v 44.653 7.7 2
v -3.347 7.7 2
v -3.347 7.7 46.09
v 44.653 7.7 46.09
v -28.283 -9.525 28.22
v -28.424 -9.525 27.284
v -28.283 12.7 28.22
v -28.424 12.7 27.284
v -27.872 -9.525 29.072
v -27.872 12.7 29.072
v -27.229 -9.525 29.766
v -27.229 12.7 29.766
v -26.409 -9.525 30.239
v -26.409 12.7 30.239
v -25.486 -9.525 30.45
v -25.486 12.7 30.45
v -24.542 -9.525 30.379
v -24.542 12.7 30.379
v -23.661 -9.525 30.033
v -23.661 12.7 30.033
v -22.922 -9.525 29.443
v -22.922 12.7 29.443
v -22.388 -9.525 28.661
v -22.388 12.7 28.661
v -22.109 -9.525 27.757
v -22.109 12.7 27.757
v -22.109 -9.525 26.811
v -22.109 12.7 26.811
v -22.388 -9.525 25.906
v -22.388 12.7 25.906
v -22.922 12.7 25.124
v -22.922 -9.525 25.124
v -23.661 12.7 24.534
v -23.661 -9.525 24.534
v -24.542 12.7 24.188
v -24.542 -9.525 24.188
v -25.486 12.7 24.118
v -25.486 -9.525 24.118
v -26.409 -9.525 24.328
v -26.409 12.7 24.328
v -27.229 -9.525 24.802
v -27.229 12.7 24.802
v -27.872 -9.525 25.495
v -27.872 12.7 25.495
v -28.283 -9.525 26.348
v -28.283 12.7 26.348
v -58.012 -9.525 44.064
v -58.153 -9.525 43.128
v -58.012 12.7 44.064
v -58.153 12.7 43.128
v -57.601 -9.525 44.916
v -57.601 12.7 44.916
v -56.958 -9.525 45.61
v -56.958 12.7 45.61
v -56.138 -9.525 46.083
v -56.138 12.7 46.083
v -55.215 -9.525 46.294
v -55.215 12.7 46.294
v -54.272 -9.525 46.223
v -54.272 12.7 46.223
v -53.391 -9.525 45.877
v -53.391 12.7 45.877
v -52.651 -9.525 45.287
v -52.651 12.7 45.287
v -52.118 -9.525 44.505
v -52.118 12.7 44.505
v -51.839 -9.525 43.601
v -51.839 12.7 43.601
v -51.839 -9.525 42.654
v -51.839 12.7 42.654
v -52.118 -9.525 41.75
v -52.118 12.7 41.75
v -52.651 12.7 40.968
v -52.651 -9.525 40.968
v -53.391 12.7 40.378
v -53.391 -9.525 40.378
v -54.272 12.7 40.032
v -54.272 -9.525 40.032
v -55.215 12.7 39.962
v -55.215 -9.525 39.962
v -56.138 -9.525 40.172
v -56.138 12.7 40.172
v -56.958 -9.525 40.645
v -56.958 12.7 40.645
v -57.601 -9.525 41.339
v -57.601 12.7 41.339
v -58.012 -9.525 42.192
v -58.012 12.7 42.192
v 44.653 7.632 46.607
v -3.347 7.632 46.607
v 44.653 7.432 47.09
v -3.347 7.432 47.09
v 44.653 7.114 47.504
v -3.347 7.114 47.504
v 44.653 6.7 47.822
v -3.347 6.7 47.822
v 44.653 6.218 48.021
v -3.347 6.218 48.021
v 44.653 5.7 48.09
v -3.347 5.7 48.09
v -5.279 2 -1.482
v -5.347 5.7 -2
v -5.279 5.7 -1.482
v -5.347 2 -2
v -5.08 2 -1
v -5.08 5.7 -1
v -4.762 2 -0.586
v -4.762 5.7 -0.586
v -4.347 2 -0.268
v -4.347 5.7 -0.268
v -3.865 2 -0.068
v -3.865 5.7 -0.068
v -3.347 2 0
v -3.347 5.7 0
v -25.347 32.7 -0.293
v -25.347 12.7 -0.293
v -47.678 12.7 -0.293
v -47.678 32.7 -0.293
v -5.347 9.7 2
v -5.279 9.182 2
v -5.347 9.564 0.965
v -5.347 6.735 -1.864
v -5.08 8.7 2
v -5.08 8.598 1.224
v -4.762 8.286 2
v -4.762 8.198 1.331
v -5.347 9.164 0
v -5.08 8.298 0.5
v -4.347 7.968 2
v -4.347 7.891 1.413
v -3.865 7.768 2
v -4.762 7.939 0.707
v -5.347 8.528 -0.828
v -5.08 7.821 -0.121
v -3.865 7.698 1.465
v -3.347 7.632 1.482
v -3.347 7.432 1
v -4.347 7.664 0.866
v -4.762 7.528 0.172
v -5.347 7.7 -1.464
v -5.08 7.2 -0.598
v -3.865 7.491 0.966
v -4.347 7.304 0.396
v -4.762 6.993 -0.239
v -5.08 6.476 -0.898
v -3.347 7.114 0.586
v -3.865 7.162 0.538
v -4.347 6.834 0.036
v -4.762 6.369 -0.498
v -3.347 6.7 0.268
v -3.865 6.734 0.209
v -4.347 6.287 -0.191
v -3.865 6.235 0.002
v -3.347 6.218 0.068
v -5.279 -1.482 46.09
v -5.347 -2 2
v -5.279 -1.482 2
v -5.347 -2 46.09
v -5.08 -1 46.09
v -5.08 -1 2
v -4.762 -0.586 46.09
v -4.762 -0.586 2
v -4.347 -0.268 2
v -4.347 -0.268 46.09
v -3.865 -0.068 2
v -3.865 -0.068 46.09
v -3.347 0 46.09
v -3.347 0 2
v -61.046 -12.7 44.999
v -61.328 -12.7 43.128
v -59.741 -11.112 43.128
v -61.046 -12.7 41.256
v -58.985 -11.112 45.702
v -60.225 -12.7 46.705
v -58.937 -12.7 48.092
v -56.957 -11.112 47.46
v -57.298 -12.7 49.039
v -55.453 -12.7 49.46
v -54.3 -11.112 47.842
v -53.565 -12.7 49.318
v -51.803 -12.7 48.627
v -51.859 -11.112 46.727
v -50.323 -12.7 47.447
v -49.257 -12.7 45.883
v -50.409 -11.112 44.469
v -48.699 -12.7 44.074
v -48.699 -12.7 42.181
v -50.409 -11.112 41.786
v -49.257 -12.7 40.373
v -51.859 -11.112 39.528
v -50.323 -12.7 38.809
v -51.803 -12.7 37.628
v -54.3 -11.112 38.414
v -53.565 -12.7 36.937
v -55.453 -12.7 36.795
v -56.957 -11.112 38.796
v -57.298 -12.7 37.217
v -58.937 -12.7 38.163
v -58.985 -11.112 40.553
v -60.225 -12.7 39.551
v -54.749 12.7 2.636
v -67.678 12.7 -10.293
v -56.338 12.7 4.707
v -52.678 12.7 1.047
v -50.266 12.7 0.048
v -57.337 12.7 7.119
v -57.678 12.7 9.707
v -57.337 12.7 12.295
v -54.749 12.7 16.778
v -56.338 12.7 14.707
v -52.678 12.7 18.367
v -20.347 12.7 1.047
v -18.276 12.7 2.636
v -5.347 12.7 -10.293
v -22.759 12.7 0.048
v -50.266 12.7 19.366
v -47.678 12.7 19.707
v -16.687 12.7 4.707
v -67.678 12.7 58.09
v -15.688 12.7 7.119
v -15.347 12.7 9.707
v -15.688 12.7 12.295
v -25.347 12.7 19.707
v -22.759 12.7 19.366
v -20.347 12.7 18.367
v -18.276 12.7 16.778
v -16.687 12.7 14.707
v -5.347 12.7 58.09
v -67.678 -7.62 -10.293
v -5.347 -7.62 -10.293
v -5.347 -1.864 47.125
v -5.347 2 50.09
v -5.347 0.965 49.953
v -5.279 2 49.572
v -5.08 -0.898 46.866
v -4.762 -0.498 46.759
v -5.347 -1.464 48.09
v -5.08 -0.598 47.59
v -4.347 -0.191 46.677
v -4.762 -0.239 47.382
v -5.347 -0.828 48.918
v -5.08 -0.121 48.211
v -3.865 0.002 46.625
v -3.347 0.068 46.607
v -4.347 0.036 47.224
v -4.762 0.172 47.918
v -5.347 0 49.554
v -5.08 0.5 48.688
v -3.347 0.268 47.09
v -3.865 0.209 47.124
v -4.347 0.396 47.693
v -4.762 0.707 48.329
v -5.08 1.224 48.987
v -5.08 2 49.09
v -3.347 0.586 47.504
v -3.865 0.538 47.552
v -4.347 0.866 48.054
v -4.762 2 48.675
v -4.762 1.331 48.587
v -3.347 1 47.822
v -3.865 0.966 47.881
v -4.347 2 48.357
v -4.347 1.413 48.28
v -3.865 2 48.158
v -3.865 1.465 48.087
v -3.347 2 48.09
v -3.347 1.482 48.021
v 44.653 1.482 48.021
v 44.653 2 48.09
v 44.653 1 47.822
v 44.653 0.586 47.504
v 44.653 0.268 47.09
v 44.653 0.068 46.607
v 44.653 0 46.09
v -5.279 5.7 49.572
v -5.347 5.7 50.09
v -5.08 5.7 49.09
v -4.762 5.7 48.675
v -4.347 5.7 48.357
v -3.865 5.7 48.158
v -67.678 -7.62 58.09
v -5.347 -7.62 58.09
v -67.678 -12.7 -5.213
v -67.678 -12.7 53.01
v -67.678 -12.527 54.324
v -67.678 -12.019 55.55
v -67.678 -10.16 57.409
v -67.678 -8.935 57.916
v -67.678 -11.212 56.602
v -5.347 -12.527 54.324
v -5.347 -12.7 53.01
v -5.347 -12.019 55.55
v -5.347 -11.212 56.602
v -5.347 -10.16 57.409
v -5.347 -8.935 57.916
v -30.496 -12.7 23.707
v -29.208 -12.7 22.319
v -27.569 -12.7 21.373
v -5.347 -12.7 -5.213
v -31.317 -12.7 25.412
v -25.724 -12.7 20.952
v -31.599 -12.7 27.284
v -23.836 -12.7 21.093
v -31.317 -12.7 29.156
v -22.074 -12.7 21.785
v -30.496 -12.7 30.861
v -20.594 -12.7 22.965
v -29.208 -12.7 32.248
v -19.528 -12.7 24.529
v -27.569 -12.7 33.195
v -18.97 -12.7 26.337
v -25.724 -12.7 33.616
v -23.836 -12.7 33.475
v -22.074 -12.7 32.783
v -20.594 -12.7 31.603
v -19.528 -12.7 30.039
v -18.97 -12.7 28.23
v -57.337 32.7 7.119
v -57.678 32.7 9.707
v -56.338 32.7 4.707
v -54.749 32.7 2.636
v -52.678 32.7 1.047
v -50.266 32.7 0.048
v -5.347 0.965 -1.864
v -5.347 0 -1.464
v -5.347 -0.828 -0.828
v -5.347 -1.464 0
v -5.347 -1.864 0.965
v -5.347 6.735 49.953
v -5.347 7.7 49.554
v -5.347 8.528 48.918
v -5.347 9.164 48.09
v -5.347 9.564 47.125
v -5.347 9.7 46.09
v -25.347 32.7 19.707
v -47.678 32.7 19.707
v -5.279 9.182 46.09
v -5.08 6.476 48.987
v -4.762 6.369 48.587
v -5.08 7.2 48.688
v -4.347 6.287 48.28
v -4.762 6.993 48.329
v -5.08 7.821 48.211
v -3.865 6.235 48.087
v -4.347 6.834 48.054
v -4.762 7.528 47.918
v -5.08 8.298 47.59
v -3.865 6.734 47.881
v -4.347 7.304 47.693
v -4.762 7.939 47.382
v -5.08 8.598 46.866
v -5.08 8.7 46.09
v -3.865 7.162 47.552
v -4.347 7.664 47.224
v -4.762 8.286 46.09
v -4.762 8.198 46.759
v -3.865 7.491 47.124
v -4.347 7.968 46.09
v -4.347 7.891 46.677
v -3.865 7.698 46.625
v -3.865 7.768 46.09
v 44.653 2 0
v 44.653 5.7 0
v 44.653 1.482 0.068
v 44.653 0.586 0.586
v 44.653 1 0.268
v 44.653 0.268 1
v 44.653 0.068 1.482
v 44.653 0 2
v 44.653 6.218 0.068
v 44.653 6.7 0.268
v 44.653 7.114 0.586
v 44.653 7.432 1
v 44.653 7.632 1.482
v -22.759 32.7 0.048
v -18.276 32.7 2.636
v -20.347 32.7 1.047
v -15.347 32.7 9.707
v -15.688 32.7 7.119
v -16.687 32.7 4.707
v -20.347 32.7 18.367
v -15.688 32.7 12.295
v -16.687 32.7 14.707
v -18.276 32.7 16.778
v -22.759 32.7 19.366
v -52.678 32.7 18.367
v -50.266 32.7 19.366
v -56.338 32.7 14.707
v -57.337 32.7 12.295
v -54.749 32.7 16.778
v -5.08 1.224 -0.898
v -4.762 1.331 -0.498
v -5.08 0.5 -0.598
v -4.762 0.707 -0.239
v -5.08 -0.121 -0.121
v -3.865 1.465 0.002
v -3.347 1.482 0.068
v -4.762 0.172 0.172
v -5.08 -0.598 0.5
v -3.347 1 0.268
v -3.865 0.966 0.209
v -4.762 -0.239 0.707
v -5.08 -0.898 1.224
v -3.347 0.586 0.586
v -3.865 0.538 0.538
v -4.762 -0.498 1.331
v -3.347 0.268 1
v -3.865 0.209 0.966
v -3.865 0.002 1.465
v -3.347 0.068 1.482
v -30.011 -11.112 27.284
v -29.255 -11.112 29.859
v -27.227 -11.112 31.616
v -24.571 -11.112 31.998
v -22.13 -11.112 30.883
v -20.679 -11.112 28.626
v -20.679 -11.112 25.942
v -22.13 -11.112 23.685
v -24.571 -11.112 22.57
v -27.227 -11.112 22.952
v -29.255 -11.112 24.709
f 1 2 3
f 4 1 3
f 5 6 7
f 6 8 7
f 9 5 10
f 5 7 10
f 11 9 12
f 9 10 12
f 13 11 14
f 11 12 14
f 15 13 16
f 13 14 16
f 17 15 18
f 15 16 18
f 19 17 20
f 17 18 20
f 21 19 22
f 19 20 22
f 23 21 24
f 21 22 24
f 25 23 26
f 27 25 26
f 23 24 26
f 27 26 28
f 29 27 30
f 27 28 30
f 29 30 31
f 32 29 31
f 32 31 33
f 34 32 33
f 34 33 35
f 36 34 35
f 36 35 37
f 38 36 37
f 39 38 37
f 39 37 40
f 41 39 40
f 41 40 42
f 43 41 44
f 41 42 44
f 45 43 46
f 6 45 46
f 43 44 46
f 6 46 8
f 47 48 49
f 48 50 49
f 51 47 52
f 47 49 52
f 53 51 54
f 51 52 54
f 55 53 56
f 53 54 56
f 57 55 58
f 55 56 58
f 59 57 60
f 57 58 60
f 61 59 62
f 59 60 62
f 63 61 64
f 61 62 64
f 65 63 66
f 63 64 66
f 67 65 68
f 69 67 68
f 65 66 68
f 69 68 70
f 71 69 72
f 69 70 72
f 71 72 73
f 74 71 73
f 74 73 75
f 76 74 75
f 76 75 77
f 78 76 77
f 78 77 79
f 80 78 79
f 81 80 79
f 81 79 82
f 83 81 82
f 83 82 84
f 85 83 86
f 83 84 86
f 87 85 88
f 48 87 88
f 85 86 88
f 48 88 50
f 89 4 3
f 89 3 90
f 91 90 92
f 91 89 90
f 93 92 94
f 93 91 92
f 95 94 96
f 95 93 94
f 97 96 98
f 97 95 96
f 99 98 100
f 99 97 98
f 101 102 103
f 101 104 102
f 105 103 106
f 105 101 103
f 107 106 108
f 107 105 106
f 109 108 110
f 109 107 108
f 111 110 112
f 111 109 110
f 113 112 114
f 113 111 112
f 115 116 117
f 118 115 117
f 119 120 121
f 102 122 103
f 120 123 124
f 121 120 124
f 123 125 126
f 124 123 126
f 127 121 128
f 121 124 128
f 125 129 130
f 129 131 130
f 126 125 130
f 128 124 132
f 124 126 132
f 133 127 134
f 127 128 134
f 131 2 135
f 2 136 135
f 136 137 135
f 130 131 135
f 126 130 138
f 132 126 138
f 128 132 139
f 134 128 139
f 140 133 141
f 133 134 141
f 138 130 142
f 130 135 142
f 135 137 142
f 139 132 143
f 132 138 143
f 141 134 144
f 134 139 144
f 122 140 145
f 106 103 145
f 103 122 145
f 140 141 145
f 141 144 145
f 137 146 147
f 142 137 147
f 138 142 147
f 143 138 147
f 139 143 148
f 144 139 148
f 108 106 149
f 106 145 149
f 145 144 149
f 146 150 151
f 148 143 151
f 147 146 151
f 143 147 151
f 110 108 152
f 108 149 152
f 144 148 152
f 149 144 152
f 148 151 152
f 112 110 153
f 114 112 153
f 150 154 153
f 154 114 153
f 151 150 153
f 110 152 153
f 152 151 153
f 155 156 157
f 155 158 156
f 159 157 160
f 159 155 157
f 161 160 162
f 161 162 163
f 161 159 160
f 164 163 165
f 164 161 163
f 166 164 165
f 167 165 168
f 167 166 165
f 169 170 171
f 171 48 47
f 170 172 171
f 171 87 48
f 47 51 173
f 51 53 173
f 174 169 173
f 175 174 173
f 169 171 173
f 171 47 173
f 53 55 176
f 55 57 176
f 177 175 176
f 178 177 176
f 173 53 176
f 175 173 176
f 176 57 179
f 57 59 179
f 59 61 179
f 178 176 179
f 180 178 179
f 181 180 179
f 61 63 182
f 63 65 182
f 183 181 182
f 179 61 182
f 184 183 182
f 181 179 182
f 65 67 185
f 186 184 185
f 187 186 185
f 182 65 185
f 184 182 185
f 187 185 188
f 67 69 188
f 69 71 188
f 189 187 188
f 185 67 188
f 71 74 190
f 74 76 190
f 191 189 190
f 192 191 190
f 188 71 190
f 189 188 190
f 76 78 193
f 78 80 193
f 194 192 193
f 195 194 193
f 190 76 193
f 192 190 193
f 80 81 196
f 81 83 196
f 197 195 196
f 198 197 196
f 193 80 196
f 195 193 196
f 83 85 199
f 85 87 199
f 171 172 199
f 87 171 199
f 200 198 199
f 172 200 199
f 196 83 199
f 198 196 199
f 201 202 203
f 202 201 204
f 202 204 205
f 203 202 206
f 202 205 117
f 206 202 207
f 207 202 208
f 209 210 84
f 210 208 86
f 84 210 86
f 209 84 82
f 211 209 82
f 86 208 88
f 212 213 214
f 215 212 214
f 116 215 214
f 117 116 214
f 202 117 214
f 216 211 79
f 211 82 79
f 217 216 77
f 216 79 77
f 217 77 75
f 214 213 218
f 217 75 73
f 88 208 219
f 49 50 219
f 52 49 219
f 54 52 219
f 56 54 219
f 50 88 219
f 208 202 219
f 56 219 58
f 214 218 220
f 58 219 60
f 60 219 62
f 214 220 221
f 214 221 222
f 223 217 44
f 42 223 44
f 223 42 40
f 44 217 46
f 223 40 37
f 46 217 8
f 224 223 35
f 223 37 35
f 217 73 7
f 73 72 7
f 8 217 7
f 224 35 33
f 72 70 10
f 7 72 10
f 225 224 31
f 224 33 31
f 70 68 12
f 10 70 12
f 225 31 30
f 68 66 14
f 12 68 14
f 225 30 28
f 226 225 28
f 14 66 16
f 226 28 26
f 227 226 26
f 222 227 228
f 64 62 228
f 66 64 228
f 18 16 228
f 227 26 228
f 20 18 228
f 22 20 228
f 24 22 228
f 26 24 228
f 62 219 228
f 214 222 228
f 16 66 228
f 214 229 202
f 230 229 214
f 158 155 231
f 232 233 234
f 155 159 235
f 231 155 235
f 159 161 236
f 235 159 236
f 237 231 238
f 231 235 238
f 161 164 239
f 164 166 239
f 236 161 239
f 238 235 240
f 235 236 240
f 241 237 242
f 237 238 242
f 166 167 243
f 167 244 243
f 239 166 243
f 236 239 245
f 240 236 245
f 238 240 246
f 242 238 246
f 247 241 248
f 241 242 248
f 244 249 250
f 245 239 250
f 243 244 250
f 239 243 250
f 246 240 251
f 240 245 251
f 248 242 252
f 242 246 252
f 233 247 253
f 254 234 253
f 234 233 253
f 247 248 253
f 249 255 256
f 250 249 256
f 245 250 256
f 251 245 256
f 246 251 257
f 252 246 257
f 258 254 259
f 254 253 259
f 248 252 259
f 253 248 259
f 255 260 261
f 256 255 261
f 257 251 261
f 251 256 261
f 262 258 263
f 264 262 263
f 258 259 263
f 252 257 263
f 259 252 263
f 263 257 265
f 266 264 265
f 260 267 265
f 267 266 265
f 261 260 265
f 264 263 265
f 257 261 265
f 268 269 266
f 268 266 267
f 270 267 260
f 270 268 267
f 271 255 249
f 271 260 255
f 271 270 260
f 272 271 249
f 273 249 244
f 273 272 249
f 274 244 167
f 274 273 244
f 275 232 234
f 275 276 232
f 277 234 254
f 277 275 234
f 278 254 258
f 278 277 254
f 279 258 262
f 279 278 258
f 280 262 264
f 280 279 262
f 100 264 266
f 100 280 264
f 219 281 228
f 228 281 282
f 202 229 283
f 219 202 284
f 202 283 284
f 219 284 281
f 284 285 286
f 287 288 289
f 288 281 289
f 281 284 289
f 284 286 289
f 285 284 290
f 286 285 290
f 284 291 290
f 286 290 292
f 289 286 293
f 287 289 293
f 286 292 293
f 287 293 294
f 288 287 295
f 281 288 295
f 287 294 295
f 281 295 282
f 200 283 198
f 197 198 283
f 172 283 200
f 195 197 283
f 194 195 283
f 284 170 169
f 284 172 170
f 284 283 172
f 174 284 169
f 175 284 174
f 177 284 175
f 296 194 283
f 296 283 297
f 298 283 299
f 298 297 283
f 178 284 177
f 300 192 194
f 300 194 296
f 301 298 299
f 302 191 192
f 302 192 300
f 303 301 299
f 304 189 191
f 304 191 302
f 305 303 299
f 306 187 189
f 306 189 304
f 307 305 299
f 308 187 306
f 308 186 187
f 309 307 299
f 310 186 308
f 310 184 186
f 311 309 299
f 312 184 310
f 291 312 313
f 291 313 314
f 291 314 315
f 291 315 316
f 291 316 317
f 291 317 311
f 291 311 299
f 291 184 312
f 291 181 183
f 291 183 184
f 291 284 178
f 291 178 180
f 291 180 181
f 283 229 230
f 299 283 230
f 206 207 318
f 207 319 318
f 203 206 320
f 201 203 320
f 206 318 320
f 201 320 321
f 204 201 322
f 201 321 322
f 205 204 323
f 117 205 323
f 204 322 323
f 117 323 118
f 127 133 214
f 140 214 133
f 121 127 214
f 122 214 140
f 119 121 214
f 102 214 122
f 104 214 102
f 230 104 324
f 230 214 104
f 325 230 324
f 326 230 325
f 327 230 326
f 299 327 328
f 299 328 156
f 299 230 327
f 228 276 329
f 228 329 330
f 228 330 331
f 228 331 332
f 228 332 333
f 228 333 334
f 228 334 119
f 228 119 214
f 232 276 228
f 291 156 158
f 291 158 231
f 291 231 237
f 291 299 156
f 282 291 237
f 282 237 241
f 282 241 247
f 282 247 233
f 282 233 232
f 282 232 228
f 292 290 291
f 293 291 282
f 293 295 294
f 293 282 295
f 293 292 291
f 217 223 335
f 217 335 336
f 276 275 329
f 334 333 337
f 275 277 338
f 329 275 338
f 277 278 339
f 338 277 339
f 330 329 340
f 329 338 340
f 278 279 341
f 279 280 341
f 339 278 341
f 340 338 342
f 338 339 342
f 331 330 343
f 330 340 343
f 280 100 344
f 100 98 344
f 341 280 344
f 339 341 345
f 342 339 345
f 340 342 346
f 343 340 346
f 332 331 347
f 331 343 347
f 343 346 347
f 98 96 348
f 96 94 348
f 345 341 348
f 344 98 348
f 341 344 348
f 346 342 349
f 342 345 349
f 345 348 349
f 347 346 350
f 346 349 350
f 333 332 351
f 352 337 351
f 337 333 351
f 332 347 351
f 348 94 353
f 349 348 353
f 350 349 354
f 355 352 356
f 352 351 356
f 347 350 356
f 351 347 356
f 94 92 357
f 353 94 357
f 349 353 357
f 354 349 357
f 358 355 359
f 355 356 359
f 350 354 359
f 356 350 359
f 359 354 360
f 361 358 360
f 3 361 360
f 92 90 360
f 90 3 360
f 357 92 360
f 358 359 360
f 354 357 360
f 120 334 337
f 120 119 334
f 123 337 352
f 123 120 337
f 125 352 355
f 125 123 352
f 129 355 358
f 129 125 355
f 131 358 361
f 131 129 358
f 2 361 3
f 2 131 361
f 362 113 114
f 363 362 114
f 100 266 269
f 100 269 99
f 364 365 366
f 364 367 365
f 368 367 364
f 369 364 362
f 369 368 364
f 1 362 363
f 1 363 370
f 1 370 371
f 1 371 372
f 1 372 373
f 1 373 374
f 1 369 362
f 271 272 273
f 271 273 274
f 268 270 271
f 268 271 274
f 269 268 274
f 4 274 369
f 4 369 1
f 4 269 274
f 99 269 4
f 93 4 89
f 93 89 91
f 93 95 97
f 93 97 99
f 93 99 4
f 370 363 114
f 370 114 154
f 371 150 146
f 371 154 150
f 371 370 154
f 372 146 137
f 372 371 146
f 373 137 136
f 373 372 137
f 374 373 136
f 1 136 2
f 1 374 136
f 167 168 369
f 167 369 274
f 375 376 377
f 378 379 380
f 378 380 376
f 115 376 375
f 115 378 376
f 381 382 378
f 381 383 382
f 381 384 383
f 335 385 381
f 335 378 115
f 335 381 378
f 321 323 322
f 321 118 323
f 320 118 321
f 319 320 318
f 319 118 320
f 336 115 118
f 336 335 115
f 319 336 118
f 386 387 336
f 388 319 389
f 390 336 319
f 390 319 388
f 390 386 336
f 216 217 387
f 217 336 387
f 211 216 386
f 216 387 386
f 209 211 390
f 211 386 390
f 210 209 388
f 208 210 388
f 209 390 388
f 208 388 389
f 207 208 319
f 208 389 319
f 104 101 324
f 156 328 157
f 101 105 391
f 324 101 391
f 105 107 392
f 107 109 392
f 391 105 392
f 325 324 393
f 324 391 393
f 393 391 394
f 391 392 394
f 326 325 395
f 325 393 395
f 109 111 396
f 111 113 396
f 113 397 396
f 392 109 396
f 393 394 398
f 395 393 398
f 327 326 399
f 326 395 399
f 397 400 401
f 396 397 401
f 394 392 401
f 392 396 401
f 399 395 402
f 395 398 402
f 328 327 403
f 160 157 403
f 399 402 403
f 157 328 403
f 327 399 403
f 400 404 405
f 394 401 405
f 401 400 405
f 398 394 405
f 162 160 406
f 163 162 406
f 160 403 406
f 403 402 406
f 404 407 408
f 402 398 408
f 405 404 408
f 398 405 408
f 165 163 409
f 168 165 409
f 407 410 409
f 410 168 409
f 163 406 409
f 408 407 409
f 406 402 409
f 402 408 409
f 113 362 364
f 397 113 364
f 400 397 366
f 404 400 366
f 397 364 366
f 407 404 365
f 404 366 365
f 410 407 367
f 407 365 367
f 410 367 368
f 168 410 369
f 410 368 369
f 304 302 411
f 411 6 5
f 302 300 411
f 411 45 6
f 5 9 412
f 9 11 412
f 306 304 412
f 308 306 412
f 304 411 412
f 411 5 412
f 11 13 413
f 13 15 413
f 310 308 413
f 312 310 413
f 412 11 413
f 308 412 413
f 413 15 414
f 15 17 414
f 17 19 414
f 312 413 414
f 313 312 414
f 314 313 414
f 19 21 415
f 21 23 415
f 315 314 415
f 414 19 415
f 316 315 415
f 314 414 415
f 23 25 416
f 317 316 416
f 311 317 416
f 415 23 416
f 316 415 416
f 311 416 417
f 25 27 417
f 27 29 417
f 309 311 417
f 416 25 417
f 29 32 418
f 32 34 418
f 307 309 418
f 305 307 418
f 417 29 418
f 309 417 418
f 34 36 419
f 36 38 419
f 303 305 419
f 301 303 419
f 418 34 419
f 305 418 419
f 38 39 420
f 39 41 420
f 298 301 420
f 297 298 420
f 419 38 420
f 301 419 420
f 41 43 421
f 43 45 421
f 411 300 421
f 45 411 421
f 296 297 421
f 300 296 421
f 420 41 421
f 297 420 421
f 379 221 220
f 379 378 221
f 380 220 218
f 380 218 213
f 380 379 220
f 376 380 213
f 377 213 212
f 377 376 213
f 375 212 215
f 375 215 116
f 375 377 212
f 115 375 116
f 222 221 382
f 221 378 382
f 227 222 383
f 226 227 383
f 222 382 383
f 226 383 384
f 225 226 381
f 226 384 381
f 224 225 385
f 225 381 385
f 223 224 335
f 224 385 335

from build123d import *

# Parameters (mm, degrees)
F0_W           = 62.330626417
F0_H           = 68.3823013678
F1_DEPTH       = 12.7
F3_D           = 6.35
F3_CSINK_D     = 12.7
F3_CSINK_ANGLE = 90
F4_R           = 5.08
F5_SIZE        = 5.08
F6_W           = 42.330626417
F6_H           = 20
F7_DEPTH       = 20
F8_R           = 9.99999
F9_W           = 7.7
F9_H           = 48.0895394087
F10_DEPTH      = 50
F11_F1_R       = 2
F11_F2_R       = 2


# Not quite as in the source:
# - a fillet or chamfer is up to 0.001 mm smaller than in the source, because OpenCascade refuses the exact size


with BuildPart() as f1:
    # F0 (on Front) → F1 (new body, symmetric)
    with BuildSketch(Plane.XZ):
        with Locations((-36.5127732512, 23.8983887248)):
            Rectangle(F0_W, F0_H)
    extrude(amount=F1_DEPTH, both=True)

    # F3 (through all)
    with Locations(Plane.XZ.offset(12.7)):
        with Locations((-54.9780864596, 43.1276711741), (-25.2489887894, 27.2838656685)):
            CounterSinkHole(F3_D / 2, F3_CSINK_D / 2, counter_sink_angle=F3_CSINK_ANGLE)

    # F4
    f4_edges = [f1.edges().sort_by_distance(p)[0] for p in [
        (-36.512773, -12.7, 58.089539),
    ]]
    fillet(f4_edges, radius=F4_R)

    # F5
    f5_edges = [f1.edges().sort_by_distance(p)[0] for p in [
        (-36.512773, -12.7, -10.292762),
    ]]
    chamfer(f5_edges, length=F5_SIZE)

    # F6 (on face) → F7 (join)
    with BuildSketch(Plane(origin=(0, 12.7, 0), x_dir=(-1, 0, 0), z_dir=(0, 1, 0))):
        with Locations((36.5127732512, 9.7072380409)):
            Rectangle(F6_W, F6_H)
    extrude(amount=F7_DEPTH)

    # F8 (radius 10 in the source; OpenCascade refuses exactly that, so slightly less here)
    f8_edges = [f1.edges().sort_by_distance(p)[0] for p in [
        (-15.34746, 22.7, 19.707238),
        (-15.34746, 22.7, -0.292762),
        (-57.678086, 22.7, 19.707238),
        (-57.678086, 22.7, -0.292762),
    ]]
    fillet(f8_edges, radius=F8_R)

    # F9 (on face) → F10 (join)
    with BuildSketch(Plane.YZ.offset(-5.3474600427)):
        with Locations((3.85, 24.0447697043)):
            Rectangle(F9_W, F9_H)
    extrude(amount=F10_DEPTH)

    # F11: fillet of radius 2 on 6 edges, made by hand

    # F11_f1
    f11_f1_edges = [f1.edges().sort_by_distance(p)[0] for p in [
        (19.6525399573, 7.7, 48.0895394087),
        (19.6525399573, 0, 48.0895394087),
        (19.6525399573, 7.7, 0),
        (19.6525399573, 0, 0),
    ]]
    fillet(f11_f1_edges, radius=F11_F1_R)

    # F11_f2
    f11_f2_edges = [f1.edges().sort_by_distance(p)[0] for p in [
        (-5.3474600427, 0, 24.0447697043),
        (-5.3474600427, 7.7, 24.0447697043),
        (-5.3474600427, 7.1142135624, 0.5857864376),
        (-5.3474600427, 7.1142135624, 47.5037529711),
        (-5.3474600427, 0.5857864376, 47.5037529711),
        (-5.3474600427, 0.5857864376, 0.5857864376),
    ]]
    fillet(f11_f2_edges, radius=F11_F2_R)


solid = f1.part
